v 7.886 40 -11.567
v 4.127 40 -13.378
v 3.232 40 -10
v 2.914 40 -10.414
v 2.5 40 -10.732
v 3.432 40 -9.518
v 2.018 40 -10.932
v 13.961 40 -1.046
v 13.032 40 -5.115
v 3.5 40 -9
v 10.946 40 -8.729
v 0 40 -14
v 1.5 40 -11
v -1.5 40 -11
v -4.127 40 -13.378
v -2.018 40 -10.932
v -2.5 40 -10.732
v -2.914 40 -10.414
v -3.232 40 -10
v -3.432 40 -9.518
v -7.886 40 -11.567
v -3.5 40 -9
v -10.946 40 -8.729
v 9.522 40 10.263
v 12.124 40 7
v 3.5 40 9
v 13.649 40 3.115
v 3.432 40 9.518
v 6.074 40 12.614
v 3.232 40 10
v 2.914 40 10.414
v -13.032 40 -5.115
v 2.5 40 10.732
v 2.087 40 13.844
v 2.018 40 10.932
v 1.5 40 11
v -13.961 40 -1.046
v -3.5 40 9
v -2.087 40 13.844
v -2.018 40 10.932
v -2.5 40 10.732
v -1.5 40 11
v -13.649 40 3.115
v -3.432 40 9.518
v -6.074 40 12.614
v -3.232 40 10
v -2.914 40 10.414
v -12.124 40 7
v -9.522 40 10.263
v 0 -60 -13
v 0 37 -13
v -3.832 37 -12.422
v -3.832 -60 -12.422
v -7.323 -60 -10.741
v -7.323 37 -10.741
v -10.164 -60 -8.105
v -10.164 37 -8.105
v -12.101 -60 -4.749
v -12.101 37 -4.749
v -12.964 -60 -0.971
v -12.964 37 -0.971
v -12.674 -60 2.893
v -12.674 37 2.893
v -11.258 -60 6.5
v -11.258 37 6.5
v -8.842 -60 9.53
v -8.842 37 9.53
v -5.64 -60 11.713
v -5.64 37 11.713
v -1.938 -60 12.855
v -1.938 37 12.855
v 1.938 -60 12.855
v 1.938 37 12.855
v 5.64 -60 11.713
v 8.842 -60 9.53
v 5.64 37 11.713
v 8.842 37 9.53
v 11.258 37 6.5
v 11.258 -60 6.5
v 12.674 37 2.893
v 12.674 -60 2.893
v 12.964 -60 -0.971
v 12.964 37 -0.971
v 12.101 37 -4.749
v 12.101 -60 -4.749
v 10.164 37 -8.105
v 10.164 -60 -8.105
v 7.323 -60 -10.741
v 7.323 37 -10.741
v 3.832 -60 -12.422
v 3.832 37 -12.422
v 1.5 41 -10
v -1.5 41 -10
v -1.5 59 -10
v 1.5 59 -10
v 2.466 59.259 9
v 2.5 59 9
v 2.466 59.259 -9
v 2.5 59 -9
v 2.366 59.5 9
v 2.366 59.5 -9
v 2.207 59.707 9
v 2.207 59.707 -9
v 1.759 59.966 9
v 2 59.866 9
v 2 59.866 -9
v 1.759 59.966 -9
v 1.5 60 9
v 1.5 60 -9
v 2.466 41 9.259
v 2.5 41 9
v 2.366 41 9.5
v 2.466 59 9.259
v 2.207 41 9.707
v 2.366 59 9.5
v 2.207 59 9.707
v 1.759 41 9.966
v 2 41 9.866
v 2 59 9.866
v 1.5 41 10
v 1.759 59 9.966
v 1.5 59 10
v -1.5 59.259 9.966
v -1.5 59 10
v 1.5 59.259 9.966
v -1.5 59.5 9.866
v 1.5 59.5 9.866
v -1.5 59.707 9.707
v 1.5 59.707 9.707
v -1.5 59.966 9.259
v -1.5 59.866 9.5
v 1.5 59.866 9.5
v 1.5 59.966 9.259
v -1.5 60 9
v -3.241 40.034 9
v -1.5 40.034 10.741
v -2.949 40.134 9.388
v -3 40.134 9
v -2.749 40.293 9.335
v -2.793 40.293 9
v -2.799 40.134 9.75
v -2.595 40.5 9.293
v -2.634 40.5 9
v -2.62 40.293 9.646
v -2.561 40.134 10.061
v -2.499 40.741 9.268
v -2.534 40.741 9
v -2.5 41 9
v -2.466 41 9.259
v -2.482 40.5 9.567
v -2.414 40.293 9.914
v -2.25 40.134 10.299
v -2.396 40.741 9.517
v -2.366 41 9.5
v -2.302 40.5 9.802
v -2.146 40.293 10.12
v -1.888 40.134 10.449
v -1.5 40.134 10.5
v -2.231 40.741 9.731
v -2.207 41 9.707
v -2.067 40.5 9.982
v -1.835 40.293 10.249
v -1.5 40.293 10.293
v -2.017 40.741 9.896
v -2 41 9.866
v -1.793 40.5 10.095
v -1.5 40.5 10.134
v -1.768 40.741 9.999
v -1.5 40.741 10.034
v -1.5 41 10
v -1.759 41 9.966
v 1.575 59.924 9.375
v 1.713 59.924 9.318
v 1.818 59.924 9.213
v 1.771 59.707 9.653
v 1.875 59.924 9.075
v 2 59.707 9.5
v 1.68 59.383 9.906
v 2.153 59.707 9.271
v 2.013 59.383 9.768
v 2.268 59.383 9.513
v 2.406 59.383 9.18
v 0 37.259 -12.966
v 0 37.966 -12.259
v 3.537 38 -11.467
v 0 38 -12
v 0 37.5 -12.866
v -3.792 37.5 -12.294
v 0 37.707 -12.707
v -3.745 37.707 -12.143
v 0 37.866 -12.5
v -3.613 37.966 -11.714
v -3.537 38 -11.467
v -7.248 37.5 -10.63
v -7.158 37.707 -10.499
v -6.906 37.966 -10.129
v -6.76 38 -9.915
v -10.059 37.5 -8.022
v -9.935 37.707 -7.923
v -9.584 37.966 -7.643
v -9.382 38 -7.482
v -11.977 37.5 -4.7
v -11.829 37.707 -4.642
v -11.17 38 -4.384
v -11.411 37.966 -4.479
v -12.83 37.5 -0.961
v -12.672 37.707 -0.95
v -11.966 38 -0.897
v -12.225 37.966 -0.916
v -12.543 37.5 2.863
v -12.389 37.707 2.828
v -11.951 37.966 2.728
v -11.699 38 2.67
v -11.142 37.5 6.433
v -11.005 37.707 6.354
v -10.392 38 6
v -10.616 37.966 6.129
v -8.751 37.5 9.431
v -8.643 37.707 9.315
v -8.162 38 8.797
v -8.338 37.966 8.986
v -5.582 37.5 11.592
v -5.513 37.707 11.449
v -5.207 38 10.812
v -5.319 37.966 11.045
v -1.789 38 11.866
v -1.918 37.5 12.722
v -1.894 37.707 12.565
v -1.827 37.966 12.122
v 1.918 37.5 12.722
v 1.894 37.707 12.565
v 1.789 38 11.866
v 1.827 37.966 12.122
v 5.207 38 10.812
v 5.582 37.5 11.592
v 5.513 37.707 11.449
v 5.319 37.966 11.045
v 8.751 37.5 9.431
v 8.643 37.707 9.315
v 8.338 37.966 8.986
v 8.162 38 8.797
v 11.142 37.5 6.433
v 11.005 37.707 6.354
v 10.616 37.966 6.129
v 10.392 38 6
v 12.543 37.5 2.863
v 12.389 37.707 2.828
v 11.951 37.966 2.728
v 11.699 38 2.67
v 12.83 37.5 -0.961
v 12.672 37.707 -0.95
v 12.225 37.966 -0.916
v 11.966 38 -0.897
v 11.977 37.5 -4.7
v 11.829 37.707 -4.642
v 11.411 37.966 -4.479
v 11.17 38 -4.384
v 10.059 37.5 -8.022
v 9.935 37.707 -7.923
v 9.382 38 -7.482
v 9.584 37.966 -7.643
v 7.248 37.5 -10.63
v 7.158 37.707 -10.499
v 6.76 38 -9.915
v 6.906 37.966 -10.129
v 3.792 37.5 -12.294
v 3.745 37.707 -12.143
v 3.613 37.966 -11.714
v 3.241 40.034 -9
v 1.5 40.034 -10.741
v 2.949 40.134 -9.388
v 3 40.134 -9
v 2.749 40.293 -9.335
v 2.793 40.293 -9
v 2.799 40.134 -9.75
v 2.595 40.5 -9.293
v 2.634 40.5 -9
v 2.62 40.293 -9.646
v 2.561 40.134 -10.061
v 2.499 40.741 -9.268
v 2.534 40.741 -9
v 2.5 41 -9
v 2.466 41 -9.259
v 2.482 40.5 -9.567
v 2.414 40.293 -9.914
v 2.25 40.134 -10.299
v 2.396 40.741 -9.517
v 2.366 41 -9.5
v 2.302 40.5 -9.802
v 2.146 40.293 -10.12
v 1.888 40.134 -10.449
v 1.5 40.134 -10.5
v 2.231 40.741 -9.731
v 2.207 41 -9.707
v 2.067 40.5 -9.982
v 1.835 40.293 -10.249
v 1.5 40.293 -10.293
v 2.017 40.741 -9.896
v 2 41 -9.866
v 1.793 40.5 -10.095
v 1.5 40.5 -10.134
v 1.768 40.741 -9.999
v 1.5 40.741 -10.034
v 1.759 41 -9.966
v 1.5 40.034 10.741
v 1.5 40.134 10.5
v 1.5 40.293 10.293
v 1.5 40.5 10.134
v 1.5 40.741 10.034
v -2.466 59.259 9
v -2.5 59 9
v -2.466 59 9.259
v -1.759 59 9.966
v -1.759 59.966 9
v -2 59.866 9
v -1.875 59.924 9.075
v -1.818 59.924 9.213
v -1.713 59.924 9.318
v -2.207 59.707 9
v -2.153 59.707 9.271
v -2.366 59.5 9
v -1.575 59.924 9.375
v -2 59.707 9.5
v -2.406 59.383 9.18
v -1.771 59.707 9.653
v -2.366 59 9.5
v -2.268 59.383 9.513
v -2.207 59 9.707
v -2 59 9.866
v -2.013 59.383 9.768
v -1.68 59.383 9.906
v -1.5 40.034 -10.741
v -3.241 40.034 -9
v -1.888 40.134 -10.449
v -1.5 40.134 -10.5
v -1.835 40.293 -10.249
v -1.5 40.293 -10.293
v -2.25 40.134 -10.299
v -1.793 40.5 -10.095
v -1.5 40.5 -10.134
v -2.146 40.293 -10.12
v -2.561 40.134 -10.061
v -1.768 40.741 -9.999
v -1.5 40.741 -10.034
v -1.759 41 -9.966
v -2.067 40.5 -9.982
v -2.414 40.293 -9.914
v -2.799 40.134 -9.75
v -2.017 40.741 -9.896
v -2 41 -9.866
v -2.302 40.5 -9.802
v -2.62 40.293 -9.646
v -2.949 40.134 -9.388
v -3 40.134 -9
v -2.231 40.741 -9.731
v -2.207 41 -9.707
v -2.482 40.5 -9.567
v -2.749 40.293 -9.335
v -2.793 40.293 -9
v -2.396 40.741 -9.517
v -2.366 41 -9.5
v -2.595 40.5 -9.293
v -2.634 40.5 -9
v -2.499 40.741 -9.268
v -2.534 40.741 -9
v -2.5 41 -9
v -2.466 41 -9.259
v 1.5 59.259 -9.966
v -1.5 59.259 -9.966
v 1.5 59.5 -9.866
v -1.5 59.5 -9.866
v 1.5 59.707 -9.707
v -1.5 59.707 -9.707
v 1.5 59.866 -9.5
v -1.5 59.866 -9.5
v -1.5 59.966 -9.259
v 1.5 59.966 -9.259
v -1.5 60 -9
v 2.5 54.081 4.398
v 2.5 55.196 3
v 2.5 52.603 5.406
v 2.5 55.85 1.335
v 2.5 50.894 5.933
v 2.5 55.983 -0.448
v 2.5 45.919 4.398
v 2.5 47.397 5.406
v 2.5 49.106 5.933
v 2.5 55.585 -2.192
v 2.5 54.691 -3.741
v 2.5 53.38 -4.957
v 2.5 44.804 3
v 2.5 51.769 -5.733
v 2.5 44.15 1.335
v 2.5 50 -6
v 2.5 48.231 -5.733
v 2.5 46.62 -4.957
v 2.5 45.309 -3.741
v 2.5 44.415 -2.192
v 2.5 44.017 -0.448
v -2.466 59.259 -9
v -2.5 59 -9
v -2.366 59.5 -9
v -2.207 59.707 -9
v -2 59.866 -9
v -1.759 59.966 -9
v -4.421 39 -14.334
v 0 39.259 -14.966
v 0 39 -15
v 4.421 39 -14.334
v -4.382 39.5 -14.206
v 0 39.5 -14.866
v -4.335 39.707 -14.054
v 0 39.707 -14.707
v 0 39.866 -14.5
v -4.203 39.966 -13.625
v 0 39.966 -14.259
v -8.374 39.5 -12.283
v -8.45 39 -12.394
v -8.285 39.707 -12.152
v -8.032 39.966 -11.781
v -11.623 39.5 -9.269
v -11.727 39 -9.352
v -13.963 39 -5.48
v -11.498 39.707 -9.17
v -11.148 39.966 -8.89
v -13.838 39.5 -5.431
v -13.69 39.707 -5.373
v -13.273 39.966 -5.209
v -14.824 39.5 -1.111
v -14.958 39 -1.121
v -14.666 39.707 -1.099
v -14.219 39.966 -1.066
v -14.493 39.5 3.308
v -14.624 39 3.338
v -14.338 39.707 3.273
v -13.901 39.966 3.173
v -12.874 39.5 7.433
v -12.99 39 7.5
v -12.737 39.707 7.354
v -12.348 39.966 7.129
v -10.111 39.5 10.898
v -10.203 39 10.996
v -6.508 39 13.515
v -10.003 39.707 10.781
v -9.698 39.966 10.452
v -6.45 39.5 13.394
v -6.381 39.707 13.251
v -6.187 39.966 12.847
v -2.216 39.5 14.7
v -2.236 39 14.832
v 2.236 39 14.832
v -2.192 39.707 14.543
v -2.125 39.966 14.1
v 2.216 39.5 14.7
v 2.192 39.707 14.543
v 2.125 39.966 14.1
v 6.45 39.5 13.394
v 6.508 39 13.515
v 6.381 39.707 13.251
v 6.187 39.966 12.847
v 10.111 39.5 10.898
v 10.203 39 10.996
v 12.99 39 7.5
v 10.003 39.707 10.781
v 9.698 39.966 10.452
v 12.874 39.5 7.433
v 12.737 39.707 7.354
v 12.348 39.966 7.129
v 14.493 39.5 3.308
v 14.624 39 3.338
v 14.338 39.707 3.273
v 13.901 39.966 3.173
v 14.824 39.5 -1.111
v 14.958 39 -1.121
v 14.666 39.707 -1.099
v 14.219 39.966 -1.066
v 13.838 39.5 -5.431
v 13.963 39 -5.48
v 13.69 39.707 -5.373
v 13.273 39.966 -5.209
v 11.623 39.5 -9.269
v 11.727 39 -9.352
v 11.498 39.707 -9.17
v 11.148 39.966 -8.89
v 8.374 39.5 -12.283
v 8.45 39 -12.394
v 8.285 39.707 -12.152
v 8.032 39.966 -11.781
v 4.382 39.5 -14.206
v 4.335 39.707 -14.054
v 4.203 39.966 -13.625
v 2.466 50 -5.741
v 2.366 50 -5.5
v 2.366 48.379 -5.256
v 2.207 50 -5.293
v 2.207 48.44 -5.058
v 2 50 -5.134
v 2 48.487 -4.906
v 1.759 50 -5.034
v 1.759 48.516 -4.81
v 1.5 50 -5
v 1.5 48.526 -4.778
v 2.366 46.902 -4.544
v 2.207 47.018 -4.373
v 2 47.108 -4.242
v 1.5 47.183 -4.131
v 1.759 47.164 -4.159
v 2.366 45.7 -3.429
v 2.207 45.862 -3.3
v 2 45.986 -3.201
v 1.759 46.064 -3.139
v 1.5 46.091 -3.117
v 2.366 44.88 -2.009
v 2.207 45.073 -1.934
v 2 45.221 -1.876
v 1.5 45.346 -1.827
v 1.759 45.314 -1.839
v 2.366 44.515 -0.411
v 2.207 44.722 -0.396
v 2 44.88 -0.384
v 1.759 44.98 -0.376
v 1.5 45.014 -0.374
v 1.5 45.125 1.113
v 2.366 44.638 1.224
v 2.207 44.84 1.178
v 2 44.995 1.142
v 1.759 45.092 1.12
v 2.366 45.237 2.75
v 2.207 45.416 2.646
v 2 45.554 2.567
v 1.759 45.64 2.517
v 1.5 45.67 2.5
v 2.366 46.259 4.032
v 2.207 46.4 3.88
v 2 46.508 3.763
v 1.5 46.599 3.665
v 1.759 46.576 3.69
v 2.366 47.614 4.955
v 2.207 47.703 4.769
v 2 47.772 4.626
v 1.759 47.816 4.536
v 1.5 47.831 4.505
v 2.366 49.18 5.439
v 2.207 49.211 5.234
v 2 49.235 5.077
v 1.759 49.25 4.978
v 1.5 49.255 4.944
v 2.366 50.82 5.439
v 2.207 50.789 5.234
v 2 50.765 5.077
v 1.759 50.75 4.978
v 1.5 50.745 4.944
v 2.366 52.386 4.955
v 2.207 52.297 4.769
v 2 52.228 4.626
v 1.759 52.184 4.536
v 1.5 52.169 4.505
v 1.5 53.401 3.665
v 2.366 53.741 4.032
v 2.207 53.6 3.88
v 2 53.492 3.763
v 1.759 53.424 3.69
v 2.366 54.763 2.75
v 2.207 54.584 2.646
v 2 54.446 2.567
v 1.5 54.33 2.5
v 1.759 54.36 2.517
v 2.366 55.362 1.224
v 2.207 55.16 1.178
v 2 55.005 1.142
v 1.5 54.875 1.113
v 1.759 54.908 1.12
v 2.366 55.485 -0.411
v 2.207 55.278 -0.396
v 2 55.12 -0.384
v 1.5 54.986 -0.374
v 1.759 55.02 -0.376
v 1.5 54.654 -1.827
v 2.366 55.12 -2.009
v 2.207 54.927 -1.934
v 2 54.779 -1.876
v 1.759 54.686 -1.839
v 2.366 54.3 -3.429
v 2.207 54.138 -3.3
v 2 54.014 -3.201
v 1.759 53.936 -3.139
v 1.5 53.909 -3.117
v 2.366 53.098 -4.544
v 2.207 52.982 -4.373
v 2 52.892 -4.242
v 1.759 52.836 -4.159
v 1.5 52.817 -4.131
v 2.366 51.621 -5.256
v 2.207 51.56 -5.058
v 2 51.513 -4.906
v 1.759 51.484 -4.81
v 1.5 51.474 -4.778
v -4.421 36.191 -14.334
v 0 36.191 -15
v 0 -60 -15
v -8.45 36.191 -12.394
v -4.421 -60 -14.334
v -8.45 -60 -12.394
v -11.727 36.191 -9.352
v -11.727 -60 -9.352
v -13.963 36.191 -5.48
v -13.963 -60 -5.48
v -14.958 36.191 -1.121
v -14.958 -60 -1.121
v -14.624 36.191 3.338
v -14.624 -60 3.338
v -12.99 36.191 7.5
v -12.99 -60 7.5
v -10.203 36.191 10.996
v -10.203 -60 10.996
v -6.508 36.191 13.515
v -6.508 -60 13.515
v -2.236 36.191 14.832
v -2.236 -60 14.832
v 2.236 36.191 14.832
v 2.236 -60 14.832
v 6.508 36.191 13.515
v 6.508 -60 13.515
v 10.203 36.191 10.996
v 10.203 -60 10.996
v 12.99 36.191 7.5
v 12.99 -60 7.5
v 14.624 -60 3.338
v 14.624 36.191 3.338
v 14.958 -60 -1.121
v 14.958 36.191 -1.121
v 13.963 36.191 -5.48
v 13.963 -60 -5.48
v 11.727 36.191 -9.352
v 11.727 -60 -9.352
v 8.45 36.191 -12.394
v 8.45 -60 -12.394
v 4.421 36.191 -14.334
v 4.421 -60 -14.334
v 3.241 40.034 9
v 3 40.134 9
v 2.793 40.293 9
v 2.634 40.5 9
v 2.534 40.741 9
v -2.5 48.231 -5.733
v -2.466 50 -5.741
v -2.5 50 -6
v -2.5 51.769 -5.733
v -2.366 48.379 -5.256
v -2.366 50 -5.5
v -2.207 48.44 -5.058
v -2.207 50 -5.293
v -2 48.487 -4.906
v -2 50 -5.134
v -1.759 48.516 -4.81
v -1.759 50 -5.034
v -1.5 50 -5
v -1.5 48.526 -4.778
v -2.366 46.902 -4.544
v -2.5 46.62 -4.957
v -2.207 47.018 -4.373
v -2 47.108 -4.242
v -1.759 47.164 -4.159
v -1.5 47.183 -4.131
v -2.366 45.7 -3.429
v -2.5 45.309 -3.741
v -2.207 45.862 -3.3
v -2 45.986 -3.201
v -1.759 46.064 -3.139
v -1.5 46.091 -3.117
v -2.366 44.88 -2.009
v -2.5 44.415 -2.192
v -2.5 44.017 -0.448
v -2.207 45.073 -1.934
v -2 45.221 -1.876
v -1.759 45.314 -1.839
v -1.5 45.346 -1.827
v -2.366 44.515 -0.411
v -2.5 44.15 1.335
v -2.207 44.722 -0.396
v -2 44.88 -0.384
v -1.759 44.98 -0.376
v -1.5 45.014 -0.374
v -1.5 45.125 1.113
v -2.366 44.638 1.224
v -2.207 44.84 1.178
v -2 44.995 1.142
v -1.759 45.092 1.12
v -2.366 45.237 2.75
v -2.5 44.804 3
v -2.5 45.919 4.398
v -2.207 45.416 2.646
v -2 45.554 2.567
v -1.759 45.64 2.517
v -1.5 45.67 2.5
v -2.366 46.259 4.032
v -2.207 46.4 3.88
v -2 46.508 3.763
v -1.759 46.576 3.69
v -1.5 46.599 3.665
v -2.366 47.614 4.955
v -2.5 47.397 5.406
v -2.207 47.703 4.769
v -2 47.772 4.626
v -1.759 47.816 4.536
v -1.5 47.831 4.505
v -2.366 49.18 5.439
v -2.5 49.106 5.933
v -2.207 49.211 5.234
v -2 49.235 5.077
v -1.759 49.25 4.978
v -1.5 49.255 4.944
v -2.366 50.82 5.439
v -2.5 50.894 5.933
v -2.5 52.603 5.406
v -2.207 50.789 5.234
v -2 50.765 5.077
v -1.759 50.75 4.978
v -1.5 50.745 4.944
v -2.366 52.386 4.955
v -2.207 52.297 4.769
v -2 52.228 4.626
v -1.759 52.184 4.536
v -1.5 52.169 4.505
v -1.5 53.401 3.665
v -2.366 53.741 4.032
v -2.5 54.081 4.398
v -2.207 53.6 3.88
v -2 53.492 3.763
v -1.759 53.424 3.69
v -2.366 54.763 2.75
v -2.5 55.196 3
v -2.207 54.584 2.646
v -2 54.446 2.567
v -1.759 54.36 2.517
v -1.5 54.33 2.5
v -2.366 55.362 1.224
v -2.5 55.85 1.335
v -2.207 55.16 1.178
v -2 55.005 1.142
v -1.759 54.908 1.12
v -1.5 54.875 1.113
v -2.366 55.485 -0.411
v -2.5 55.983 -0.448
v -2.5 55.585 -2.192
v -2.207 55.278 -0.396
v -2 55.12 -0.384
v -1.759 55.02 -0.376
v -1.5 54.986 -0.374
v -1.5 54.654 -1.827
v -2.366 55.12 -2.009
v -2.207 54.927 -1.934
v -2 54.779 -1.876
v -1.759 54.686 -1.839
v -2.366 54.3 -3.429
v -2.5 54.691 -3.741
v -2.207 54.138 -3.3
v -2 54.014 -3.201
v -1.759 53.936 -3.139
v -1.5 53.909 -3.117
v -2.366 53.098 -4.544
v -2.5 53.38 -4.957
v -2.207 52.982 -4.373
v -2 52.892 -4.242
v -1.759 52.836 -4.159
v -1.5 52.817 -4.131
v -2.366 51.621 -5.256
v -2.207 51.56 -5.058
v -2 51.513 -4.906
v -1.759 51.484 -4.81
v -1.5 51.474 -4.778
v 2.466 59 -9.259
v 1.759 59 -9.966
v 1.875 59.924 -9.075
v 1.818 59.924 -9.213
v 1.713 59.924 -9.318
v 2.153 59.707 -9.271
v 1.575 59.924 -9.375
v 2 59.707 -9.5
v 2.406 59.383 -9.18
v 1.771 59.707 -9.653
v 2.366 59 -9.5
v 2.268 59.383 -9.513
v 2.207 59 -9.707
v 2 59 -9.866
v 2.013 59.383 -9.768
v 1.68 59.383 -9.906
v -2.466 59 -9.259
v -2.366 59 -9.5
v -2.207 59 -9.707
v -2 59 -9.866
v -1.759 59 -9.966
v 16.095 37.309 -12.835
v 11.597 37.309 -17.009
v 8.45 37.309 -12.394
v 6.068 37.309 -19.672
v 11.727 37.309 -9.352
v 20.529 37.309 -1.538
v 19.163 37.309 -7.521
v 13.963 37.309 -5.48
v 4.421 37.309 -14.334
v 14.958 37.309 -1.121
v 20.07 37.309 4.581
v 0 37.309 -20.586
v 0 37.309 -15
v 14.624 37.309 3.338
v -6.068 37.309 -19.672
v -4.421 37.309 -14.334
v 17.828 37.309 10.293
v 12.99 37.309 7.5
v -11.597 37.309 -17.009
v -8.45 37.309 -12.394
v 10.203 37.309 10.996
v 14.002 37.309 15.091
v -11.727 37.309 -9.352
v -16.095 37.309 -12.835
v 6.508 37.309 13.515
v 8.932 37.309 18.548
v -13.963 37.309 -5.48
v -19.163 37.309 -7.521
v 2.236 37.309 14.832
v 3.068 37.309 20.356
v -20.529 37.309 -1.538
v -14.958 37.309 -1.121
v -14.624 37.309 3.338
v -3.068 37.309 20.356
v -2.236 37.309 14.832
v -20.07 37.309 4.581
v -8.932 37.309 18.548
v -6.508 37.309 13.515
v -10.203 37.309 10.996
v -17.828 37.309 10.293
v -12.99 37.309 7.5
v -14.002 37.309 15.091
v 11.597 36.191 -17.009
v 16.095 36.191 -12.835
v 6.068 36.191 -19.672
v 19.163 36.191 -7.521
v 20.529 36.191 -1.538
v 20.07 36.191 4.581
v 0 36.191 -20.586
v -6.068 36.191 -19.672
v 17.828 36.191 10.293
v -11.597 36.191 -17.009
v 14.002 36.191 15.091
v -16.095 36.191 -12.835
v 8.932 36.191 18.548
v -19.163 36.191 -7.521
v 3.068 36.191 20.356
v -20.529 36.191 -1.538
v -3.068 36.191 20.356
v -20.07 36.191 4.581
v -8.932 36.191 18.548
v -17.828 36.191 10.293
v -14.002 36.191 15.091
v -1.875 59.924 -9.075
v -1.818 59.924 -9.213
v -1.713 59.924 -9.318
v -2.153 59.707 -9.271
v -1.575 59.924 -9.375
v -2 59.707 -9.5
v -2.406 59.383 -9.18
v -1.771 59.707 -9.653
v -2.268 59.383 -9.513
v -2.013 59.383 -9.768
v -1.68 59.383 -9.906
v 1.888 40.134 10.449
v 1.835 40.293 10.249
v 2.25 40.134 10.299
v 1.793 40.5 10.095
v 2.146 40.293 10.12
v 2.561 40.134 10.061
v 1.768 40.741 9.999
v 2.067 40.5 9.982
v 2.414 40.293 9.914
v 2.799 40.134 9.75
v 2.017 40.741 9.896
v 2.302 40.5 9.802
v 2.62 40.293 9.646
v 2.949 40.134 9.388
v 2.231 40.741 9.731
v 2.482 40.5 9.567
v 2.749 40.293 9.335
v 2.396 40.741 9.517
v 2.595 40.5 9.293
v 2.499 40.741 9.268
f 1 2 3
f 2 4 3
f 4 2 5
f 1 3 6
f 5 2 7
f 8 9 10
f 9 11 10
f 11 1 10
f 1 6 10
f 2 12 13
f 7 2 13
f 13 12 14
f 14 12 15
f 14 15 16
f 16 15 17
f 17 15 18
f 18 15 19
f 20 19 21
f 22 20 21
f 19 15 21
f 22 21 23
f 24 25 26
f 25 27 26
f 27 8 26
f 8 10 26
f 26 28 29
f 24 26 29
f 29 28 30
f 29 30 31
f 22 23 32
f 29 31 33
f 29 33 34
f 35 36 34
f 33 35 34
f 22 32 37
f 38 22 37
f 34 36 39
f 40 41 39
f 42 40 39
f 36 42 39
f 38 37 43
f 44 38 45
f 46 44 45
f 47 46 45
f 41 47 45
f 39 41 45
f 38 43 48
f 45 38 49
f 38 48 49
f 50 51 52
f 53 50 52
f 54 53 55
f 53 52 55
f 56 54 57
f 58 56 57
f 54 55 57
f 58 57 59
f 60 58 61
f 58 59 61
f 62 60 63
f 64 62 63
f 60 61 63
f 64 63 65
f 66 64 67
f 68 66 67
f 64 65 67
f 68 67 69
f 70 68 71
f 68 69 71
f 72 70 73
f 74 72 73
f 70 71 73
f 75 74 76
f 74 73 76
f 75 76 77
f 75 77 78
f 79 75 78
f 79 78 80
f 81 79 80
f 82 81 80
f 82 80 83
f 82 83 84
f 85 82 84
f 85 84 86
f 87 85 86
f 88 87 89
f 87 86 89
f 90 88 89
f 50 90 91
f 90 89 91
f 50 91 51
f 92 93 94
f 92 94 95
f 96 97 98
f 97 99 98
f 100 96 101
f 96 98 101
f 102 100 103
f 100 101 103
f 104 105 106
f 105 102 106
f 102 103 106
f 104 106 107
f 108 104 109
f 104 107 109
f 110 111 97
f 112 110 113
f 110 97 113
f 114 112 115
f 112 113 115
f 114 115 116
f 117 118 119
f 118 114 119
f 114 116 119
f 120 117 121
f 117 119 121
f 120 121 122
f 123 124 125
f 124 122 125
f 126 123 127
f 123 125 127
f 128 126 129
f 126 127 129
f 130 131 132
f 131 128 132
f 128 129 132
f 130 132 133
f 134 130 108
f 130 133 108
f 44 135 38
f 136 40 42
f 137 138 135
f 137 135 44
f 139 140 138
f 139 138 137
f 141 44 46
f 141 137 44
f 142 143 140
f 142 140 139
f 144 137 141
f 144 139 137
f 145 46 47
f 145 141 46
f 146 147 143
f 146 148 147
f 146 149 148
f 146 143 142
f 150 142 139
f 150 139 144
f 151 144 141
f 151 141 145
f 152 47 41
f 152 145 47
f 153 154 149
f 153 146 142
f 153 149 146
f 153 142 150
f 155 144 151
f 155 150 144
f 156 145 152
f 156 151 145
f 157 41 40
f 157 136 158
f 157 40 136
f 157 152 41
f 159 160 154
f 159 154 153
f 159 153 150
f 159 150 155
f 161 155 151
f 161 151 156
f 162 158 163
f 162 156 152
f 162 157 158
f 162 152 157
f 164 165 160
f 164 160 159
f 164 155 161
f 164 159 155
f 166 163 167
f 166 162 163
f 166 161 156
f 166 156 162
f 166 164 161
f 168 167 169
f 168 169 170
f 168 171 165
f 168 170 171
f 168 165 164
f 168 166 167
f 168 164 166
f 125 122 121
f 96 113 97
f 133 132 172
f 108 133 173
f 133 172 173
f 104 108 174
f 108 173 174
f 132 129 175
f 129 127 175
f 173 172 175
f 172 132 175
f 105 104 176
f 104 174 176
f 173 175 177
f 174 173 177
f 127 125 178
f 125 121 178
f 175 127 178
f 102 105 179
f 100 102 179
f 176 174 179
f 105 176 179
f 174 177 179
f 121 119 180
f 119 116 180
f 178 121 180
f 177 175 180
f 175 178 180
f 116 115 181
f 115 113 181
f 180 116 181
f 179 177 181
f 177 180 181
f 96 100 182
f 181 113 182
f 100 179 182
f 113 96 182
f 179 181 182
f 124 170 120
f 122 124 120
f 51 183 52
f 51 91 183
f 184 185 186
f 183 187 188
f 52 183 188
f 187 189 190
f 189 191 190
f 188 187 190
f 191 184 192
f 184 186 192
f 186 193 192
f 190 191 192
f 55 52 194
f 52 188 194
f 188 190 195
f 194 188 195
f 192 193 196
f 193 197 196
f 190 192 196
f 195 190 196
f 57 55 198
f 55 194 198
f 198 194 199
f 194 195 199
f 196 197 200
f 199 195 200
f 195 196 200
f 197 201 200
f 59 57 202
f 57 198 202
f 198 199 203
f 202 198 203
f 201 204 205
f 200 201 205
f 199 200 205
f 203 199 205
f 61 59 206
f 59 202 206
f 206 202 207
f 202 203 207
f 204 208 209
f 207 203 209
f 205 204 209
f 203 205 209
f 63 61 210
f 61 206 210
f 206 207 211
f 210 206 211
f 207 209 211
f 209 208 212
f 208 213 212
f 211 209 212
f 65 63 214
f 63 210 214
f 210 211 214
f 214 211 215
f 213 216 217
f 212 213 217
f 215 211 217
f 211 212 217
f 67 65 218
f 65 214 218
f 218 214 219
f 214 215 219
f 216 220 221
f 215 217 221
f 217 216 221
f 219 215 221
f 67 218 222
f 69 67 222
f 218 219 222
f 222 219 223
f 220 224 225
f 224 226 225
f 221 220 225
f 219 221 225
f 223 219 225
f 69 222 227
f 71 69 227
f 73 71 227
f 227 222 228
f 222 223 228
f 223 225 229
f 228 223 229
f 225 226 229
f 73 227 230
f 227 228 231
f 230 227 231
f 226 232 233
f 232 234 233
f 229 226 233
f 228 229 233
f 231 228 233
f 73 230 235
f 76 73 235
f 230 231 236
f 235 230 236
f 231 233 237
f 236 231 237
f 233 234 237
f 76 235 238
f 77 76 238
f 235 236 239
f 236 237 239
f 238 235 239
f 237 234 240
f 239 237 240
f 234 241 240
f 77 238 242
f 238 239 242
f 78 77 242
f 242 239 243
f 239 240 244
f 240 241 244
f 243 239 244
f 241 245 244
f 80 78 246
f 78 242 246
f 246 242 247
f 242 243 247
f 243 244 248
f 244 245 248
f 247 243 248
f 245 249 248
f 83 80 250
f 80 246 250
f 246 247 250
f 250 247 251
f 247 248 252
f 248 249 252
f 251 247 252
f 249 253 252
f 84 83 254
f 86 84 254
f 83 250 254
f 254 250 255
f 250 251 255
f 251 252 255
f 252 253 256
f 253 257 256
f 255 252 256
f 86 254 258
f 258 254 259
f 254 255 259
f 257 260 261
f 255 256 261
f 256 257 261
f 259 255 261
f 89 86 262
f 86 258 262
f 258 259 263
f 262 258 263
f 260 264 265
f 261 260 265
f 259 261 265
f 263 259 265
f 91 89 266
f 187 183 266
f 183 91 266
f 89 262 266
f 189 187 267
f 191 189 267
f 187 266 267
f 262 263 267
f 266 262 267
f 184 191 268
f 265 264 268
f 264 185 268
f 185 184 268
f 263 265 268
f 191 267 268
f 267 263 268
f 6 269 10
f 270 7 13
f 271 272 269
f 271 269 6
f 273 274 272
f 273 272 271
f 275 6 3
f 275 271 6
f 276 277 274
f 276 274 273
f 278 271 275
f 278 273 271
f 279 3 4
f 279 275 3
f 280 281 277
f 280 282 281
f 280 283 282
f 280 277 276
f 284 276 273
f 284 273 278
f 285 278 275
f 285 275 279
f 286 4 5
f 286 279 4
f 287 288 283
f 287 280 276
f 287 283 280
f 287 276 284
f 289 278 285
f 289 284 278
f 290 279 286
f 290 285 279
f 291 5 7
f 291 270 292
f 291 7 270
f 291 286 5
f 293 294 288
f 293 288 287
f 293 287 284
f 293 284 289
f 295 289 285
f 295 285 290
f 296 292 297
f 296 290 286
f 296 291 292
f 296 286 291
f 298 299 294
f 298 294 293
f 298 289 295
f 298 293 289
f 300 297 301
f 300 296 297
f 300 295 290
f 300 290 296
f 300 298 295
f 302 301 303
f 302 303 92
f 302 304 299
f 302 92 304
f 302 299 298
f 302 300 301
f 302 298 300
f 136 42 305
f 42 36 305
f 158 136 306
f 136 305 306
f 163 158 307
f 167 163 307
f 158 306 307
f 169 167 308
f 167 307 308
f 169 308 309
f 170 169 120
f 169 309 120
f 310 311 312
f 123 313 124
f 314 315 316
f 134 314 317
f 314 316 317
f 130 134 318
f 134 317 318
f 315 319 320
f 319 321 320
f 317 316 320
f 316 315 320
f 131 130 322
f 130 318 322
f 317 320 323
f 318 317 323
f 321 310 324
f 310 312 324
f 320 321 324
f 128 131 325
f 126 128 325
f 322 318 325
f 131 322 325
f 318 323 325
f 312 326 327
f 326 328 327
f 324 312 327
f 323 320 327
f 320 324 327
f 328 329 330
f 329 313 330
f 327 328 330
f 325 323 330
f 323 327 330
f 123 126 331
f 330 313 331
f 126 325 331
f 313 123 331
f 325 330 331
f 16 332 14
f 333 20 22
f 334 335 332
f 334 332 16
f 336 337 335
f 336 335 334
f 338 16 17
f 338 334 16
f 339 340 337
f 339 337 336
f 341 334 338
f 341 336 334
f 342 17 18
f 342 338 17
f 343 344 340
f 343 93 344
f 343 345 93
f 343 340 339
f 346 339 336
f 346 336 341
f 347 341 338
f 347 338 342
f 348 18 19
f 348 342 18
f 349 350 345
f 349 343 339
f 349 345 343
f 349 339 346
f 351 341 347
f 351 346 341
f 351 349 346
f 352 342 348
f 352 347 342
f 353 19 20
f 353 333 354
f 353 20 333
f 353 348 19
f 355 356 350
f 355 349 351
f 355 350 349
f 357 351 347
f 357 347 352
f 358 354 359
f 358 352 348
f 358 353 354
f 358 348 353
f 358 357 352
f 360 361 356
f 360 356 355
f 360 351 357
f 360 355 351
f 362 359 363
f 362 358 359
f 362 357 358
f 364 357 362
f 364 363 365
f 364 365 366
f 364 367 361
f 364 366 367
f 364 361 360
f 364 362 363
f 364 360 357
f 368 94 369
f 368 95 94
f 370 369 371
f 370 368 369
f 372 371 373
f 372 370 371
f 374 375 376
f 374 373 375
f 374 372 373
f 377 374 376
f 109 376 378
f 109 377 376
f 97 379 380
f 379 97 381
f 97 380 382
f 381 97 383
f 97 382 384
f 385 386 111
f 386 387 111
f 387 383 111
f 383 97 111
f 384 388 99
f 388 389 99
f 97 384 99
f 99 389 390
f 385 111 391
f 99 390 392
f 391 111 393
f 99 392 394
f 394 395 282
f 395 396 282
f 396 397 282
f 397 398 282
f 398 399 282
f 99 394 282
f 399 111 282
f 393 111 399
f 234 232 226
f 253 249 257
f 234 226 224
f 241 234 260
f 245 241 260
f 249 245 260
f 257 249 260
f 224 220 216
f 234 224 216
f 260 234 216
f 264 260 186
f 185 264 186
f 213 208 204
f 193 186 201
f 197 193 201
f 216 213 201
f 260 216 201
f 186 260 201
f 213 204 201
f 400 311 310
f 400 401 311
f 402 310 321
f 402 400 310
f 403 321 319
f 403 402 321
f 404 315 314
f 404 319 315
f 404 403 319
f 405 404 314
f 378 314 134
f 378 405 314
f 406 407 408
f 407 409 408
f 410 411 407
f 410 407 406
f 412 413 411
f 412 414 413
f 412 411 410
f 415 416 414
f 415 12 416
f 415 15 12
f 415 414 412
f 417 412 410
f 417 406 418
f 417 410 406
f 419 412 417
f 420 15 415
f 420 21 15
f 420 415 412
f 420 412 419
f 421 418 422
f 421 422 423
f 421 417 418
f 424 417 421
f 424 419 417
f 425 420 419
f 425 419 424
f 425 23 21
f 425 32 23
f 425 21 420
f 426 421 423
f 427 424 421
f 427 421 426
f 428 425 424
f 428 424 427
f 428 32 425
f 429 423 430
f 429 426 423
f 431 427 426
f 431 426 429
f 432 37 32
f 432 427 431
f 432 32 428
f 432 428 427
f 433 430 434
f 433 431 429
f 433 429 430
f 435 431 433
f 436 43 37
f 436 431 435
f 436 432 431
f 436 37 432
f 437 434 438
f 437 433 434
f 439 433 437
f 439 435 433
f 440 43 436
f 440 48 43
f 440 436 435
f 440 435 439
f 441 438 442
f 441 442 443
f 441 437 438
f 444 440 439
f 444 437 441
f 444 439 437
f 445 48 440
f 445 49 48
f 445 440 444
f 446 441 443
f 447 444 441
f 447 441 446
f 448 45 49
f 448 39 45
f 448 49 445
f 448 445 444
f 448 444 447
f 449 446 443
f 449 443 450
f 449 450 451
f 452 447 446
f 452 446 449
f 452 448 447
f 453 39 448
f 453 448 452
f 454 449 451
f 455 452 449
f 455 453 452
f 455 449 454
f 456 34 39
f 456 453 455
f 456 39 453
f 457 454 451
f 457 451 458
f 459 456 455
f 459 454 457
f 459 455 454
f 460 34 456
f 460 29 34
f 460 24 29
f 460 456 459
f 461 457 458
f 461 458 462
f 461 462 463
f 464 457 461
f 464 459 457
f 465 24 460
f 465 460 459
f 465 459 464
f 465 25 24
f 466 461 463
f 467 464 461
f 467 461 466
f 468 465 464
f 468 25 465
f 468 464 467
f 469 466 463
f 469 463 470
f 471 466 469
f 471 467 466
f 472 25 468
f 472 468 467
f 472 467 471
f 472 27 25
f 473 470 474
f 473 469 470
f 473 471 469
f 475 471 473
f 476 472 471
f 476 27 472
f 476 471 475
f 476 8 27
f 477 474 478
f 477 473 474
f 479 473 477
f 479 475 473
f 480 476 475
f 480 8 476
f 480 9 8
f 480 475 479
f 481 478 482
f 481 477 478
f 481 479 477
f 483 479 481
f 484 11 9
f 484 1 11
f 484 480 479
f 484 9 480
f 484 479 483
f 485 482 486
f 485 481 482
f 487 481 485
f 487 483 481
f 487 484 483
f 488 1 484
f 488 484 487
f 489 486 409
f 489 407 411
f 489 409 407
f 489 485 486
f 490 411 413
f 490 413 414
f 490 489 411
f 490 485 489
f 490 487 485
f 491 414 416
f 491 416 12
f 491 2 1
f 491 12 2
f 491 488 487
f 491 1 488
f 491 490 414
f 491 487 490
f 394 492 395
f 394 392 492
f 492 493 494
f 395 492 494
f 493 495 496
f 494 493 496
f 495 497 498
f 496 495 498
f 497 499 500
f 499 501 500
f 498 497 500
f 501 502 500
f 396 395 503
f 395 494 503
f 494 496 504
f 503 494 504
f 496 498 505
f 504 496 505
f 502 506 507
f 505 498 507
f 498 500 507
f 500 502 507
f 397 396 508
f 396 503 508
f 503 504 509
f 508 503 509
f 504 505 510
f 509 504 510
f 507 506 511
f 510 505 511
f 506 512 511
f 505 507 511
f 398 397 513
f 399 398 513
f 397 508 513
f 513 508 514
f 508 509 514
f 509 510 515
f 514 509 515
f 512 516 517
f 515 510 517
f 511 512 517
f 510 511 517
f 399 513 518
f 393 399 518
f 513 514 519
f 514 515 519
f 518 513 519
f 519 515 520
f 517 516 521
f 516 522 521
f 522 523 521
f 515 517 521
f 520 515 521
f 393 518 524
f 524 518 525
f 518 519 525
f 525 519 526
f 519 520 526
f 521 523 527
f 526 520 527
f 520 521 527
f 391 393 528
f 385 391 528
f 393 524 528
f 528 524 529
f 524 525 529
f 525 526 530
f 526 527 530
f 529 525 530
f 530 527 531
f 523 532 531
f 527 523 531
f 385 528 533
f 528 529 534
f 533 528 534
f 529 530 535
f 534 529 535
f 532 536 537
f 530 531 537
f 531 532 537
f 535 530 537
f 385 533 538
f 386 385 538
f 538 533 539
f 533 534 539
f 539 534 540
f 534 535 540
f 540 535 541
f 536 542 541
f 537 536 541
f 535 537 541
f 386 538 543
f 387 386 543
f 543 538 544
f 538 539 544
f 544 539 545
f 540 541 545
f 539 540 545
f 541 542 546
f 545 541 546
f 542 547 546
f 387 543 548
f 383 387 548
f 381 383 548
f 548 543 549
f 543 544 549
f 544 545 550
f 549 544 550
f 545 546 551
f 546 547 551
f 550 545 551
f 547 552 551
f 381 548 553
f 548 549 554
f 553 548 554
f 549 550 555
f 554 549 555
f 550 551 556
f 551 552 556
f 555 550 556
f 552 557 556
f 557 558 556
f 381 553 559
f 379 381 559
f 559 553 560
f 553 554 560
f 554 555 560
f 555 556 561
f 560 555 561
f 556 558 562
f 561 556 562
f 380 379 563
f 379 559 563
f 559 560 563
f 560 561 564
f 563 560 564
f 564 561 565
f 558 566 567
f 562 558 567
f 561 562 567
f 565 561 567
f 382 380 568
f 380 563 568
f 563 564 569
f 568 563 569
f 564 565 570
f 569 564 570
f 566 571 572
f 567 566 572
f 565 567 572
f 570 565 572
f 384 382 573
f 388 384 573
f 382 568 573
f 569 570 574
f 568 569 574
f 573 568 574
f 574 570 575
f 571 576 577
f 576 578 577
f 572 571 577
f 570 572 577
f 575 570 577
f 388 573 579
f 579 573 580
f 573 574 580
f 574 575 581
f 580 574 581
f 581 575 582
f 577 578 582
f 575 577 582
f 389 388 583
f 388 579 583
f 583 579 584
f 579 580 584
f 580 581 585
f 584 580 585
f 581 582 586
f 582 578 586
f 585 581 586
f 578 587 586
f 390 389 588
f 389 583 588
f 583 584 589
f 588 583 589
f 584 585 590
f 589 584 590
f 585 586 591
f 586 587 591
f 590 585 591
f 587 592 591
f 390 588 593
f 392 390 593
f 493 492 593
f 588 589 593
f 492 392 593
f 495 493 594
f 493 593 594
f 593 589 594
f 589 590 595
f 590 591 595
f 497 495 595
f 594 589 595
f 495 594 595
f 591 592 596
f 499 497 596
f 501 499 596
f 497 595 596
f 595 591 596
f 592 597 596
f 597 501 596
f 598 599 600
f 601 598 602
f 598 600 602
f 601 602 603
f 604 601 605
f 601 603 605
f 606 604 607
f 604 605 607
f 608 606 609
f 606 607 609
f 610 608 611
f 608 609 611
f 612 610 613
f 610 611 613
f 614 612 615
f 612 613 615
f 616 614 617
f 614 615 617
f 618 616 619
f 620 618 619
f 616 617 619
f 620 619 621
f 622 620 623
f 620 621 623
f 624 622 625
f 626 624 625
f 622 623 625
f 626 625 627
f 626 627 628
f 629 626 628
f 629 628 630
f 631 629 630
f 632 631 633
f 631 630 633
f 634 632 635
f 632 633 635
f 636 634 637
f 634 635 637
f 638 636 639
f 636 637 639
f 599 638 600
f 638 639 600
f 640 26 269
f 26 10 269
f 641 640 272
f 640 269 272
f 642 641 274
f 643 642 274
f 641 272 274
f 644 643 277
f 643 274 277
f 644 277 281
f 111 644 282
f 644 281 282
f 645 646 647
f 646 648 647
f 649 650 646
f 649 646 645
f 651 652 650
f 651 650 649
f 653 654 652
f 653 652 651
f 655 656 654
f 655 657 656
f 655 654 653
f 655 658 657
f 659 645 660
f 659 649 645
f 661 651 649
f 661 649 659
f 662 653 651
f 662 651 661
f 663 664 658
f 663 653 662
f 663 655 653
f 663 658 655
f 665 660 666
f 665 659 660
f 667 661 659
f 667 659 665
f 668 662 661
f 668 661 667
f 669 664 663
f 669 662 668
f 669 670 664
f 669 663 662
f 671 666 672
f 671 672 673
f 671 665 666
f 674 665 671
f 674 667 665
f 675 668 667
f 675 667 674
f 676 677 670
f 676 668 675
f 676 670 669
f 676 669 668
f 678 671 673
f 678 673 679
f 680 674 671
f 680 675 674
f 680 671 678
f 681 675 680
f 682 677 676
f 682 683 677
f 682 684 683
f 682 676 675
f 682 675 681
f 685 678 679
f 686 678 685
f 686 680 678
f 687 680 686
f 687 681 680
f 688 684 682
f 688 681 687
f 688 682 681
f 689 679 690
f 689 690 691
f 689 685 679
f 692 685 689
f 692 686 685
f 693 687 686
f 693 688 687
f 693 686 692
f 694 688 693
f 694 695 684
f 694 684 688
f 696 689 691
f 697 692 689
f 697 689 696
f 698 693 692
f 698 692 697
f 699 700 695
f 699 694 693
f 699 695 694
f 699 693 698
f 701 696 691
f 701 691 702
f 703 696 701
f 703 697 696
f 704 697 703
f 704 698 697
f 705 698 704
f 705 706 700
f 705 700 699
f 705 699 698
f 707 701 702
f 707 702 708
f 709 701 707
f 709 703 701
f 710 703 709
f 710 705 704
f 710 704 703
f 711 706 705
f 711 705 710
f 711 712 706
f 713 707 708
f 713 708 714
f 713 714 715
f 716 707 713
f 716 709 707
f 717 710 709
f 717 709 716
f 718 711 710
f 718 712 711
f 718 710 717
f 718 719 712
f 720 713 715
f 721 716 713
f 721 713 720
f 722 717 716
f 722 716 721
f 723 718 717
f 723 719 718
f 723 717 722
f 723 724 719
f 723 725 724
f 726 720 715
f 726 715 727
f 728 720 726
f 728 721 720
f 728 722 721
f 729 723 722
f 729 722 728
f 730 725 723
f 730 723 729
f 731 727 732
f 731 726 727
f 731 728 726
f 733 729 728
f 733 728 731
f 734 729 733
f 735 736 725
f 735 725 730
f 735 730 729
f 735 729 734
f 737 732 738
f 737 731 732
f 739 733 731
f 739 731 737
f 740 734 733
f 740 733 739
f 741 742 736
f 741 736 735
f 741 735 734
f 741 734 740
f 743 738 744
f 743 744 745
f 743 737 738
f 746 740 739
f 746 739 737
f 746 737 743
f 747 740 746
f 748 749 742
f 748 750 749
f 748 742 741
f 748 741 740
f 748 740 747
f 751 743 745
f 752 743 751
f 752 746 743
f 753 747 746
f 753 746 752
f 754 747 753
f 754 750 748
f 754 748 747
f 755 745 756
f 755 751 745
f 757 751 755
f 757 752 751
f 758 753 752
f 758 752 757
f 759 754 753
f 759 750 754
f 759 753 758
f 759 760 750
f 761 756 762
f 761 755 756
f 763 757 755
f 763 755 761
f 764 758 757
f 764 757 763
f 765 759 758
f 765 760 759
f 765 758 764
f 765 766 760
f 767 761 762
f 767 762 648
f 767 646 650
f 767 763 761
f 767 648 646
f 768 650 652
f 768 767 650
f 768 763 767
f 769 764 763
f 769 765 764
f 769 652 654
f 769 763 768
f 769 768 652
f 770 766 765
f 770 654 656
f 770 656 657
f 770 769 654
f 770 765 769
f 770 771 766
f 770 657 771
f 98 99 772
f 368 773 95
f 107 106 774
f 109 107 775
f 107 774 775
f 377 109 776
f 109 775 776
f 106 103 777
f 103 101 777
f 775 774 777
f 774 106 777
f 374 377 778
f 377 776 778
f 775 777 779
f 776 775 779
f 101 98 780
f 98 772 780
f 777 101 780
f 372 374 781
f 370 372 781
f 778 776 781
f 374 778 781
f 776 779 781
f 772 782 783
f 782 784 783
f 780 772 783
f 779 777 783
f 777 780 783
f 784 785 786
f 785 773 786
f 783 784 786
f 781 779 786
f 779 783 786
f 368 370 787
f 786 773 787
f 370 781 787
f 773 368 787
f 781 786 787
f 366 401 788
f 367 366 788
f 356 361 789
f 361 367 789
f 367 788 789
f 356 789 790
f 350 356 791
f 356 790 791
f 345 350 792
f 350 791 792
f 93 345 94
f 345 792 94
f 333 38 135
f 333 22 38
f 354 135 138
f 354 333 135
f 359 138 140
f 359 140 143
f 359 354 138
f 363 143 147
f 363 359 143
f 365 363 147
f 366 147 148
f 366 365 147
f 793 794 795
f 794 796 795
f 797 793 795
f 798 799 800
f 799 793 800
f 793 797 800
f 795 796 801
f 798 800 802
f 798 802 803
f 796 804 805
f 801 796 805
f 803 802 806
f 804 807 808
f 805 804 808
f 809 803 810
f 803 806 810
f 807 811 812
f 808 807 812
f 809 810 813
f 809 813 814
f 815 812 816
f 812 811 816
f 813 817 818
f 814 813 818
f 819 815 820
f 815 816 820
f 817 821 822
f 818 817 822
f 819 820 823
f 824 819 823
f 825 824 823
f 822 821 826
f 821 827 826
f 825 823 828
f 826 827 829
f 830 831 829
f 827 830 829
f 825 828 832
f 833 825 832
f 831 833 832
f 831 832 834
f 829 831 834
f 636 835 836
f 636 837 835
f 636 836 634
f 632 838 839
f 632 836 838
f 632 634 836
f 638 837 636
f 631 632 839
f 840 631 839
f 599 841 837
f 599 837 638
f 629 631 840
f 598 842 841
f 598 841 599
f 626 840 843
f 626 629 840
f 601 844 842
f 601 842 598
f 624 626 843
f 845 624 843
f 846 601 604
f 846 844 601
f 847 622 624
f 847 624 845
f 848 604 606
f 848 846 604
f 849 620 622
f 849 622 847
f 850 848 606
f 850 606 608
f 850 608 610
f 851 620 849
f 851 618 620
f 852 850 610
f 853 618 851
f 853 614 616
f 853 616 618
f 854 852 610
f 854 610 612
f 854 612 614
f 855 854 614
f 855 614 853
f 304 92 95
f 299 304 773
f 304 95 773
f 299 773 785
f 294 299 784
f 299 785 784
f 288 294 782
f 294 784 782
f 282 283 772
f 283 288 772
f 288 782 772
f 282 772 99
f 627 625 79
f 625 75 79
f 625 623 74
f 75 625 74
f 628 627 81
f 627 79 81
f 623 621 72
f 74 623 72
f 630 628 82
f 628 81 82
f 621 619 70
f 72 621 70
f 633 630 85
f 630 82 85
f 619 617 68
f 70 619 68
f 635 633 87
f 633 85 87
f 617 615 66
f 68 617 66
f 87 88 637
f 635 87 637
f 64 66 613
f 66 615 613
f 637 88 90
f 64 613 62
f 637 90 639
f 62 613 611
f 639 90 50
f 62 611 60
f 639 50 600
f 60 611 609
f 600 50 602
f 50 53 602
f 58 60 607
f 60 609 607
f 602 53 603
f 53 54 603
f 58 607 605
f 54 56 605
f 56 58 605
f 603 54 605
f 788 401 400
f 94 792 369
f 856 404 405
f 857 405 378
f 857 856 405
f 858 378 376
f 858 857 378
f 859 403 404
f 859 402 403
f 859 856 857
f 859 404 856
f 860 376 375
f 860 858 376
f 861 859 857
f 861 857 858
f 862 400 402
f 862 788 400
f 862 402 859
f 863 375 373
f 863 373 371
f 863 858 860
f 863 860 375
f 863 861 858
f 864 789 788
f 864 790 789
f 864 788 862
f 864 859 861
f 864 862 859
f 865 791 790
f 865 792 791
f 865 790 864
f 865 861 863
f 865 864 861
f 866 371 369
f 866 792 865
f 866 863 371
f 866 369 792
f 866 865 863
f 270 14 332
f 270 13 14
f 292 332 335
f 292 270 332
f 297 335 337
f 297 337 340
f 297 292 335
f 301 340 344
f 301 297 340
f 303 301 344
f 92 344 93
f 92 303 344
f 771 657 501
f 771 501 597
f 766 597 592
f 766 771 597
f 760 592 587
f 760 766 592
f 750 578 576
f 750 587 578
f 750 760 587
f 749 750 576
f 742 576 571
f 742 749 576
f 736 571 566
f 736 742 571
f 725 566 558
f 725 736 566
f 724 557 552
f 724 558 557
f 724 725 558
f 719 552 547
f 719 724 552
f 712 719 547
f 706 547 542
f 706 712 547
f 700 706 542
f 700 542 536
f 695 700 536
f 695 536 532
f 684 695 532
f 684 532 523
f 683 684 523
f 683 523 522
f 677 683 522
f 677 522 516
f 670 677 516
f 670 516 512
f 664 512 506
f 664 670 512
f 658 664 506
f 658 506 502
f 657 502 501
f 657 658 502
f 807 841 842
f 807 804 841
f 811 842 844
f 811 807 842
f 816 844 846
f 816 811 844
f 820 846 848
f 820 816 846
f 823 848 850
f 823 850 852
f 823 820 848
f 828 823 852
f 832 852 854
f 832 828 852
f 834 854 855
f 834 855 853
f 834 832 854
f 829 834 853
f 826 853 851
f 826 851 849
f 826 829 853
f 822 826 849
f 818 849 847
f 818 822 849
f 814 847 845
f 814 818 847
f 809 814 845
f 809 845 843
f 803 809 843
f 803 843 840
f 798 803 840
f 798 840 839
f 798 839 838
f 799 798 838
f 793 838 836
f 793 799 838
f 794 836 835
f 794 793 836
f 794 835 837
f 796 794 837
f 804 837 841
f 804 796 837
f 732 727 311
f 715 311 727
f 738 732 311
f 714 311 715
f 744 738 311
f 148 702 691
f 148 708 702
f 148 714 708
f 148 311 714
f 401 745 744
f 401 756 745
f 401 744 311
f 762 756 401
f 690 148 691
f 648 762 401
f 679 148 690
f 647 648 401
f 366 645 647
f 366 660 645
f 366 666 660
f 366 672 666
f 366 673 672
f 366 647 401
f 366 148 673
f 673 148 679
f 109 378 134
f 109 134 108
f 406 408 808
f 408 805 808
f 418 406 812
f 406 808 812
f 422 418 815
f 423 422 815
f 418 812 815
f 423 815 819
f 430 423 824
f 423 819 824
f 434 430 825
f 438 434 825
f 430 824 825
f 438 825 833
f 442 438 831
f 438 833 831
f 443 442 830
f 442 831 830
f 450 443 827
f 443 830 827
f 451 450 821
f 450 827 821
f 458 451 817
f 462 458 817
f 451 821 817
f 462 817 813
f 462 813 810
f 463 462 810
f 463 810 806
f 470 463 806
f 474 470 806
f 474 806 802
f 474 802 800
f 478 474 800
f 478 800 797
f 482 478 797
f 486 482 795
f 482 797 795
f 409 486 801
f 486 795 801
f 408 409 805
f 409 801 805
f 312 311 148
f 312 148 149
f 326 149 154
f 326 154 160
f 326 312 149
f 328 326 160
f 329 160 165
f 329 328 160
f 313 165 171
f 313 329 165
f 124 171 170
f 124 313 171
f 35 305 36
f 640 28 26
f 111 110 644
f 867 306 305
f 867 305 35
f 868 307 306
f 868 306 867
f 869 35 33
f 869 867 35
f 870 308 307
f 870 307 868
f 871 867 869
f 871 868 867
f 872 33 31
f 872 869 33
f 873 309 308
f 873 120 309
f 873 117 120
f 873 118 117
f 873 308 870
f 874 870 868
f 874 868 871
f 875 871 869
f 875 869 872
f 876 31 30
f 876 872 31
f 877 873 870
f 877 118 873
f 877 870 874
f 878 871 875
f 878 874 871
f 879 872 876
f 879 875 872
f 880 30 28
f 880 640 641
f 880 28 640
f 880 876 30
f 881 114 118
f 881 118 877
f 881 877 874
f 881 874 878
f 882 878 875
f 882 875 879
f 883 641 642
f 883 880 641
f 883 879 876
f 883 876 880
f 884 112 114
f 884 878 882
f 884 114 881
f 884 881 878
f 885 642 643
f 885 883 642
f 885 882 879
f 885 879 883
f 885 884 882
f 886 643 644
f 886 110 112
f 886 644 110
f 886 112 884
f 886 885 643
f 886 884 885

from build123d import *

# Parameters (mm, degrees)
SKETCH2_W               = 5
SKETCH2_H               = 20
BOSS_EXTRUDE1_DEPTH     = 20
CUT_EXTRUDE1_DEPTH      = 65.274800661
CUT_EXTRUDE1_DEPTH_BACK = 65.274800661
SKETCH3_R               = 5
FILLET2_R               = 1
SKETCH4_W               = 5.586282465
SKETCH4_H               = 1.117897551


with BuildPart() as part:
    # Sketch1 → Revolve1 (revolve)
    with BuildSketch(Plane(origin=(0, 0, 0), x_dir=(0, 0, -1), z_dir=(1, 0, 0)), mode=Mode.PRIVATE) as revolve1_sk:
        Polygon((-15, 40), (-15, -60), (-13, -60), (-13, 38), (0, 38), (0, 40), align=None)
    revolve(revolve1_sk.sketch.rotate(Axis((0, 0, 0), (0, 1, 0)), 180), axis=Axis((0, 0, 0), (0, 1, 0)))

    # Sketch2 → Boss-Extrude1 (add)
    with BuildSketch(Plane(origin=(0, 40, 0), x_dir=(1, 0, 0), z_dir=(0, 1, 0))):
        Rectangle(SKETCH2_W, SKETCH2_H)
    extrude(amount=BOSS_EXTRUDE1_DEPTH)

    # Sketch3 → Cut-Extrude1 (cut, two sides: drawn at the far end of the back side and taken through both)
    with BuildSketch(Plane(origin=(2.5, 0, 0), x_dir=(0, 0, -1), z_dir=(1, 0, 0)).offset(-CUT_EXTRUDE1_DEPTH_BACK)):
        with Locations((0, 50)):
            Circle(SKETCH3_R)
    extrude(amount=CUT_EXTRUDE1_DEPTH + CUT_EXTRUDE1_DEPTH_BACK, mode=Mode.SUBTRACT)

    # Fillet2
    fillet2_edges = [part.edges().sort_by_distance(p)[0] for p in [
        (-2.5, 40, 0),
        (-2.5, 50, -10),
        (0, 40, 10),
        (-2.5, 50, 10),
        (2.5, 40, 0),
        (2.5, 50, 10),
        (0, 40, -10),
        (2.5, 50, -10),
        (-2.5, 60, 0),
        (0, 60, 10),
        (2.5, 60, 0),
        (0, 60, -10),
        (2.5, 50, 5),
        (-2.5, 50, 5),
        (0, 38, 13),
        (0, 40, 15),
    ]]
    fillet(fillet2_edges, radius=FILLET2_R)

    # Sketch4 → Revolve2 (revolve)
    with BuildSketch(Plane.XY, mode=Mode.PRIVATE) as revolve2_sk:
        with Locations((17.793141233, 36.750165078)):
            Rectangle(SKETCH4_W, SKETCH4_H)
    revolve(revolve2_sk.sketch.rotate(Axis((0, 0, 0), (0, 1, 0)), 90), axis=Axis((0, 0, 0), (0, 1, 0)))


solid = part.part
